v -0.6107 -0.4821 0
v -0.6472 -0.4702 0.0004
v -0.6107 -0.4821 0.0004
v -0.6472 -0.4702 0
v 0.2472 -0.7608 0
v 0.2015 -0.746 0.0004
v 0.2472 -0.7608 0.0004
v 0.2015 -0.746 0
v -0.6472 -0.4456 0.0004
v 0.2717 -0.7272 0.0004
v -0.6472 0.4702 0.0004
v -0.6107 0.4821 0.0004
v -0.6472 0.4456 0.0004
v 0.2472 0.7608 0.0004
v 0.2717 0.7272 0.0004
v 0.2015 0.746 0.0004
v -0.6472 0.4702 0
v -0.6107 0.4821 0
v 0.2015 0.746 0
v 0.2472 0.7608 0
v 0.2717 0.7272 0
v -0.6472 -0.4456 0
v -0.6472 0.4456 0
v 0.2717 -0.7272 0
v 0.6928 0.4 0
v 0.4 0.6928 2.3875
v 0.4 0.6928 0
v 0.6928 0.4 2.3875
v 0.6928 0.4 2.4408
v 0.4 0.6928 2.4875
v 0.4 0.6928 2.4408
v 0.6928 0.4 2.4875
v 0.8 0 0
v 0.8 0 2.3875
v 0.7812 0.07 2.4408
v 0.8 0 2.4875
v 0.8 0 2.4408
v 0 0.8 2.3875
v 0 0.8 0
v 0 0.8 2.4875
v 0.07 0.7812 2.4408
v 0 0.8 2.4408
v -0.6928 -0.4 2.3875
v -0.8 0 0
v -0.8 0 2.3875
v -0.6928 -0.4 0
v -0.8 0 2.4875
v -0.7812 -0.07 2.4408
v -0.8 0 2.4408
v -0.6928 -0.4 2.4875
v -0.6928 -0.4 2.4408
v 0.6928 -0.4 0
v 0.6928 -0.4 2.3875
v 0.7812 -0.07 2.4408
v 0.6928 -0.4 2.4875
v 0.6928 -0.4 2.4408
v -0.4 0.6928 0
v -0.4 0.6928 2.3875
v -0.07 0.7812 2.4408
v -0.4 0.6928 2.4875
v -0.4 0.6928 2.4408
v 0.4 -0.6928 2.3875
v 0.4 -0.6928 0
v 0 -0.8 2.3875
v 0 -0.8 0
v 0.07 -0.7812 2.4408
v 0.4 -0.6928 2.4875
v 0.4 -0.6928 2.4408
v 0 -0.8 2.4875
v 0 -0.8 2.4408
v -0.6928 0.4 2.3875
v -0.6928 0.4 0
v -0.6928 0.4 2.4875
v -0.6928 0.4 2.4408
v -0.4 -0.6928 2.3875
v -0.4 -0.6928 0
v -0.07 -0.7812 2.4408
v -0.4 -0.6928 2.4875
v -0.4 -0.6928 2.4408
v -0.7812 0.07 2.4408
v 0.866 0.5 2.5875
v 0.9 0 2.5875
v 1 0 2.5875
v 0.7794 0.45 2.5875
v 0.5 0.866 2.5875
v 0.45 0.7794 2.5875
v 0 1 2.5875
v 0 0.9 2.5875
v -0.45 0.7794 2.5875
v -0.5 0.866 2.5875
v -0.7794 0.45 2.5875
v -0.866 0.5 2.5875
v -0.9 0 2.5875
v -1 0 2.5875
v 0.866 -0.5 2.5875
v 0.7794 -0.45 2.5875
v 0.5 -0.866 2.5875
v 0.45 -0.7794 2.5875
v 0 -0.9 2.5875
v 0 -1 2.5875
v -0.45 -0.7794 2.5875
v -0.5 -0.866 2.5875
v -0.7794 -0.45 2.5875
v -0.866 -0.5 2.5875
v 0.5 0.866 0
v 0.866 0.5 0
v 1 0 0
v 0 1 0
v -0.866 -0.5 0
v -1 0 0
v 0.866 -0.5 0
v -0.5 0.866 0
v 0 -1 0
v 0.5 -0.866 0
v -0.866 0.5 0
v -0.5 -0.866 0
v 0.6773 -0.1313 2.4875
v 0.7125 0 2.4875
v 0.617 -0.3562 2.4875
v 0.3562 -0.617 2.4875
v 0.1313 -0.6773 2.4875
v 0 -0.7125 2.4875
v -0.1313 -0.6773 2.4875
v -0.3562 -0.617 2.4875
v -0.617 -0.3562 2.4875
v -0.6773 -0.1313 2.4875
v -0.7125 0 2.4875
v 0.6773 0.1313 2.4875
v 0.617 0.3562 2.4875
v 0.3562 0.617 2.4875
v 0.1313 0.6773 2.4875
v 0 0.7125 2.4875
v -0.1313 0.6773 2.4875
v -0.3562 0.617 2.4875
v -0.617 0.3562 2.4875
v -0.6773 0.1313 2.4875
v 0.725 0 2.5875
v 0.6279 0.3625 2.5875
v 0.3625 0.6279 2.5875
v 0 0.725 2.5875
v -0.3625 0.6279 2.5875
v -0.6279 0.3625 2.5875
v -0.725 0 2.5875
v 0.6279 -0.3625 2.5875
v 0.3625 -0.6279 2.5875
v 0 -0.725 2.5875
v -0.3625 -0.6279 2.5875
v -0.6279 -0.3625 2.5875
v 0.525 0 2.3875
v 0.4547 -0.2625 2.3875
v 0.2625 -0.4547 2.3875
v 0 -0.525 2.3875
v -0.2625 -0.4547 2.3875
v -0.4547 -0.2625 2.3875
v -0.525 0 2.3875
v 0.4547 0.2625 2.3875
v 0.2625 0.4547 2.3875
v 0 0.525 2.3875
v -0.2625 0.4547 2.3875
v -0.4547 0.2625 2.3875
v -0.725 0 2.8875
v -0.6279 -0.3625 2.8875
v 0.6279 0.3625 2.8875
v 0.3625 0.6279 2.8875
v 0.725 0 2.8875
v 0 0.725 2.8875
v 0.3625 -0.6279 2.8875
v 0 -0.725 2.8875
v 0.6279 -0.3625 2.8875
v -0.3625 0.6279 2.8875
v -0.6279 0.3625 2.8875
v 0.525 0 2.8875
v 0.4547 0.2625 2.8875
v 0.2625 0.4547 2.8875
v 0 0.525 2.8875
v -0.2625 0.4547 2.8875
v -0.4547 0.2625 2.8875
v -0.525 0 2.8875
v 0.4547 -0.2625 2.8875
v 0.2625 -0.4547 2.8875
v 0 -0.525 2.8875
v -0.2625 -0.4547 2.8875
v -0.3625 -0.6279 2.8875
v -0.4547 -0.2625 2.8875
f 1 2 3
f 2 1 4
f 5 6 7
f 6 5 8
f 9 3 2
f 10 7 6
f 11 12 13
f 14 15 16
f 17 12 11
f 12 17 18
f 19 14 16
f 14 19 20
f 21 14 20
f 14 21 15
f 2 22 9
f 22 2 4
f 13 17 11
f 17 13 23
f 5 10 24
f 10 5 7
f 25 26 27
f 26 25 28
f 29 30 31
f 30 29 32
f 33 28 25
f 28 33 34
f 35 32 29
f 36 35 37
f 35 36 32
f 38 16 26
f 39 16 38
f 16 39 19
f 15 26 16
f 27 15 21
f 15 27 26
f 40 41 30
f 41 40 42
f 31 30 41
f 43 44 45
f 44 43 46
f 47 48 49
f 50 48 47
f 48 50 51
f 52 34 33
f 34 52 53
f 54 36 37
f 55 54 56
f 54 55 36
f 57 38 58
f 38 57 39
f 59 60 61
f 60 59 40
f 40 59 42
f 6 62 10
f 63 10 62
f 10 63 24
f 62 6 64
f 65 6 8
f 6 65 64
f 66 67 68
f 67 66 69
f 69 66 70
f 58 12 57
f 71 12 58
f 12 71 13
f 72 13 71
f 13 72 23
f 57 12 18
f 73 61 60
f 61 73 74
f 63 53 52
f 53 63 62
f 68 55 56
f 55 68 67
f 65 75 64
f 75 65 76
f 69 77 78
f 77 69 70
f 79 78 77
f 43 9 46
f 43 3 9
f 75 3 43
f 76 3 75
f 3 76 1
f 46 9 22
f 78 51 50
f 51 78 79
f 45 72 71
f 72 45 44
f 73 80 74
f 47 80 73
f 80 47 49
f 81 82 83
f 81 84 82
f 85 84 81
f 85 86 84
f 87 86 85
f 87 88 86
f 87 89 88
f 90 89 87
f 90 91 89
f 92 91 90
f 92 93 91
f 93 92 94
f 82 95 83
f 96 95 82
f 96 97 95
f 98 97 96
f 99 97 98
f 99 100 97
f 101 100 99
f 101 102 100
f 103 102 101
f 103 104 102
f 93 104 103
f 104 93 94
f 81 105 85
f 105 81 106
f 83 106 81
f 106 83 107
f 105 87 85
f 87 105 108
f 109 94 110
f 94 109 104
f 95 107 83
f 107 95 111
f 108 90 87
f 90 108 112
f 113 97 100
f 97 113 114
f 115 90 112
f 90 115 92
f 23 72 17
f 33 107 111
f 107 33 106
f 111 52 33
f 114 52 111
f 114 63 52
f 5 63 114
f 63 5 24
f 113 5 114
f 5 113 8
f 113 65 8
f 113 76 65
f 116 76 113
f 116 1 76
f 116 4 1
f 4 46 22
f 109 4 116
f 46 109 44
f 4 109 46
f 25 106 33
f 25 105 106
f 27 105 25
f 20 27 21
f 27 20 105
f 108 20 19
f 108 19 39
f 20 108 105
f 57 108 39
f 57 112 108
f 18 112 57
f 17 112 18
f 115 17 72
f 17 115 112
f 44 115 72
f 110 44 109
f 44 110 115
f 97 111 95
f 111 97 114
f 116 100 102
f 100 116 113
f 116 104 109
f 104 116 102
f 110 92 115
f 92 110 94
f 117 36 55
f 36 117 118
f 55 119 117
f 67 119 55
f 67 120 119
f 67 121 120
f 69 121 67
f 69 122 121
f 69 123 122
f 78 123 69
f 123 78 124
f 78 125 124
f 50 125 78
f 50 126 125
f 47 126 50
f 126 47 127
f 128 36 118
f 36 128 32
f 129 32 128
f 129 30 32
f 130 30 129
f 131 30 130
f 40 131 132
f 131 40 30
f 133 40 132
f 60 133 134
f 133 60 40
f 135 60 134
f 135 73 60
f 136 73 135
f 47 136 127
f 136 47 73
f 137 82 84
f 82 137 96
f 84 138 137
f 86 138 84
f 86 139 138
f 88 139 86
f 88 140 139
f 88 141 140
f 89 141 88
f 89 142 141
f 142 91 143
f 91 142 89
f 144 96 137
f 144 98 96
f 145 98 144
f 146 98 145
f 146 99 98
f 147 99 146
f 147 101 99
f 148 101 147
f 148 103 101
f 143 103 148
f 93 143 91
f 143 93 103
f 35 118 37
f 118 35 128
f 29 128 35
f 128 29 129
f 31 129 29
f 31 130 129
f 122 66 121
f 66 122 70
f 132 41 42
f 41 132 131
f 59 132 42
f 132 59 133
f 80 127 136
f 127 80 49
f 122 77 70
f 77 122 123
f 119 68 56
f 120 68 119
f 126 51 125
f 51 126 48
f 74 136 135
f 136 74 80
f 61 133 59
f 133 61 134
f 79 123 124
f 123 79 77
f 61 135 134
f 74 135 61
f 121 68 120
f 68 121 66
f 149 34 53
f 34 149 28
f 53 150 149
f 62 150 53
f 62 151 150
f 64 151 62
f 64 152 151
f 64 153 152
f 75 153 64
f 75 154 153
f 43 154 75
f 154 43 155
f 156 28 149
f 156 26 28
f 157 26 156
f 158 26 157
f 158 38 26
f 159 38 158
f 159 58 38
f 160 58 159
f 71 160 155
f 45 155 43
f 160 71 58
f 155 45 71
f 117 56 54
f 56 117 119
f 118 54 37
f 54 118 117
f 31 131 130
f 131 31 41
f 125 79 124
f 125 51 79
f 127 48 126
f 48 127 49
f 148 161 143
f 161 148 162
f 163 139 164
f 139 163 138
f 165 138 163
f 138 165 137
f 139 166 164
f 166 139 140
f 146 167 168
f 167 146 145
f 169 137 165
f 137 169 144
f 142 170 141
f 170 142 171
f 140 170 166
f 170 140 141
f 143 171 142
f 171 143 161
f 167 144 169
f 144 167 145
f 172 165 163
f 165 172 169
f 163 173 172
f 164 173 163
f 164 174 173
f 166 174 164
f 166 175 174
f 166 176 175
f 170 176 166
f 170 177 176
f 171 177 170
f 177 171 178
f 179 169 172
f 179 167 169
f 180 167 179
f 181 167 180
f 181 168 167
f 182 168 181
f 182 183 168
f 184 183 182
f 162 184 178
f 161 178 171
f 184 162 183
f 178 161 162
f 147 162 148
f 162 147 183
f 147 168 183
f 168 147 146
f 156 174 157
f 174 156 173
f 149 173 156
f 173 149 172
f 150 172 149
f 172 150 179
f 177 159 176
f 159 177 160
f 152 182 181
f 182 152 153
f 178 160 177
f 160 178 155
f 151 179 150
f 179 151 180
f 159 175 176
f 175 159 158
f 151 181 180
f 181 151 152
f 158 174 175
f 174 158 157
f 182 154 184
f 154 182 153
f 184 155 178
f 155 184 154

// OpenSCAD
tolerance=0.075;
hole_radius=0.075;
grid_hole_radius=0.075;
outer_radius=1;
thickness=0.2;
hole_attach_height=0.075;
attach_thickness=0.1;

//parameters that don't have to be defined explicitly
eps = tolerance/100;
inner_radius = outer_radius - thickness;
fn = 12;
fnh = 6;

module angled_cylinder(angle_deg_y, _h, _r, angle_deg_x = 0) {
    rotate([angle_deg_x, angle_deg_y, 0]) { // Rotate the cylinder 
            cylinder(h = _h, r = _r, center = true, $fn = fnh);
        }
}

module hole(_h) {
    cylinder(h = _h, r = grid_hole_radius, $fn = fnh);
}

//makes circle of holes
module circular_grid(_h, _r, _n) {
    for (i = [0:_n-1]) {
        angle = i * 360 / _n;
        x_pos = _r * cos(angle);
        y_pos = _r * sin(angle);
        translate([x_pos, y_pos, -eps]) {
            hole(_h);
        }
    }
}

//makes grid of holes
module hole_grid(hole_height, grid_h) {
    translate([0,0,hole_height]) {
        difference() {
            //cylinder
            cylinder(h = grid_h, r = (inner_radius + outer_radius)/2, 
                center=false, $fn = fn);
            //holes
            for (i = [0 : grid_hole_radius * 2 + hole_attach_height : inner_radius - grid_hole_radius * 2]) {
                circular_grid(grid_h + eps*2, i, ceil(6.28*i/(grid_hole_radius*4)));
            }
            
        } 
    }
}

//makes curve of CSC
module curve(_radius, _twist, _turning_angle, _turning_radius) {
    rotate([90,0,_twist])
    translate([-_turning_radius, 0, 0])
    rotate_extrude(angle=_turning_angle, convexity=100, $fn = fn)
    translate([_turning_radius, 0]) circle(_radius);
}

module CSC(_r, _t1, _ta1, _tr1, _h, _t2, _ta2, _tr2, is_inner) {
    
    if (_ta1 > 90) {
        CSC(_r, _t1, 90, _tr1, 0, 0, 0, 0, is_inner);
        
        pos1 = (-_tr1 + sqrt(_tr1*_tr1 - pow(_tr1,2)));
        translate([pos1*cos(_t1),pos1*sin(_t1),_tr1])
        rotate([0,-90,_t1])
        CSC(_r, 0, _ta1 - 90, _tr1, _h, _t2, _ta2, _tr2, is_inner);
    } else if (_ta2 > 90) {
        CSC(_r, _t1, _ta1, _tr1, _h, _t2, 90, _tr2, is_inner);
        
        pos1 = (-_tr1 + sqrt(_tr1*_tr1 - pow(_tr1*sin(_ta1),2)));
        pos2 = (-_tr2 + sqrt(_tr2*_tr2 - pow(_tr2,2)));
        translate([pos1*cos(_t1),pos1*sin(_t1),_tr1*sin(_ta1)])
        rotate([0,-_ta1,_t1])
        translate([0, 0, _h])
        translate([pos2*cos(_t2),pos2*sin(_t2),_tr2])
        rotate([0,-90,_t2])
        CSC(_r, 0, 0, 0, 0, 0, _ta2 - 90, _tr2, is_inner);
    } else {
        //intermediate positions
        pos1 = (-_tr1 + sqrt(_tr1*_tr1 - pow(_tr1*sin(_ta1),2)));
        pos2 = (-_tr2 + sqrt(_tr2*_tr2 - pow(_tr2*sin(_ta2),2)));
        
        union() {
            //bottom shell threshold
            if (is_inner) {
                cylinder(h=eps, r=_r, center=true);
            }
            
            //first curve of CSC
            curve(_r, _t1, _ta1, _tr1);
            
            //straight link of CSC
            translate([pos1*cos(_t1),pos1*sin(_t1),_tr1*sin(_ta1)])
            rotate([0,-_ta1,_t1])
            if (is_inner) {
                //add threshold for shelling
                translate([0,0,-eps /2])
                cylinder(h=_h + eps,r=_r, center = false, $fn= fn);
            } else {
                cylinder(h=_h,r=_r, center = false, $fn= fn);
            }
            
            //second curve of CSC
            translate([pos1*cos(_t1),pos1*sin(_t1),_tr1*sin(_ta1)])
            rotate([0,-_ta1,_t1])
            translate([0, 0, _h])
            curve(_r, _t2, _ta2, _tr2);
            
            //shelling thresholds
            if (is_inner) {
                translate([pos1*cos(_t1),pos1*sin(_t1),_tr1*sin(_ta1)])
                rotate([0,-_ta1,_t1])
                translate([0, 0, _h])
                translate([pos2*cos(_t2),pos2*sin(_t2),_tr2*sin(_ta2)])
                rotate([0,-_ta2,_t2]) {
                    cylinder(h=eps, r=_r, center=true,$fn=fn);
                }
            
            }
        }
    }
    
}

//allow modules to attach
module CSC_ATTACH(_r, _t1, _ta1, _tr1, _h, _t2, _ta2, _tr2, next_hole_radius, next_hole_attach_height, next_inner) {
    
    if (_ta1 > 90) {        
        pos1 = (-_tr1 + sqrt(_tr1*_tr1 - pow(_tr1,2)));
        translate([pos1*cos(_t1),pos1*sin(_t1),_tr1])
        rotate([0,-90,_t1])
        CSC_ATTACH(_r, 0, _ta1 - 90, _tr1, _h, _t2, _ta2, _tr2, next_hole_radius, next_hole_attach_height, next_inner);
    } else if (_ta2 > 90) {        
        pos1 = (-_tr1 + sqrt(_tr1*_tr1 - pow(_tr1*sin(_ta1),2)));
        pos2 = (-_tr2 + sqrt(_tr2*_tr2 - pow(_tr2,2)));
        translate([pos1*cos(_t1),pos1*sin(_t1),_tr1*sin(_ta1)])
        rotate([0,-_ta1,_t1])
        translate([0, 0, _h])
        translate([pos2*cos(_t2),pos2*sin(_t2),_tr2])
        rotate([0,-90,_t2])
        CSC_ATTACH(_r, 0, 0, 0, 0, 0, _ta2 - 90, _tr2, next_hole_radius, next_hole_attach_height, next_inner);
    } else {
        //intermediate positions
        pos1 = (-_tr1 + sqrt(_tr1*_tr1 - pow(_tr1*sin(_ta1),2)));
        pos2 = (-_tr2 + sqrt(_tr2*_tr2 - pow(_tr2*sin(_ta2),2)));
        
        translate([pos1*cos(_t1),pos1*sin(_t1),_tr1*sin(_ta1)])
        rotate([0,-_ta1,_t1])
        translate([0, 0, _h])
        translate([pos2*cos(_t2),pos2*sin(_t2),_tr2*sin(_ta2)])
        rotate([0,-_ta2,_t2]) {
            difference() {
                union() {
                    //attachment for smaller cylinder
                    translate([0,0,-attach_thickness])
                    cylinder(h=attach_thickness, r=_r - thickness/2, $fn=fn);
                    translate([0,0,-attach_thickness*2])
                    cylinder(h=attach_thickness*2, r1=_r - thickness/2, r2=next_inner - tolerance - thickness, $fn=fn);
                    
                    //small cylinder
                    cylinder(h=next_hole_radius*2 + next_hole_attach_height * 2, r = next_inner - tolerance, $fn=fn);
                }
                
                //shelling
                translate([0,0, -attach_thickness*2 - eps/2])
                cylinder(h=next_hole_radius*2 + next_hole_attach_height * 2 + attach_thickness*2 + eps, r = min(inner_radius, next_inner - tolerance - thickness), $fn=fn);
                
                //holes for screws
    //            translate([0,0,next_hole_attach_height + next_hole_radius]) {
    //                angled_cylinder(0, (next_inner + thickness + eps) * 2,  hole_radius, 90);
    //                angled_cylinder(90, (next_inner + thickness + eps) * 2, hole_radius, 0);
    //            }
            }
        }
    }
}

//remove overlap to allow all branches to attach to each other
module CSC_REMOVE_OVERLAP(_r, _t1, _ta1, _tr1, _h, _t2, _ta2, _tr2, next_hole_radius, next_hole_attach_height, next_inner) {
    if (_ta1 > 90) {        
        pos1 = (-_tr1 + sqrt(_tr1*_tr1 - pow(_tr1,2)));
        translate([pos1*cos(_t1),pos1*sin(_t1),_tr1])
        rotate([0,-90,_t1])
        CSC_REMOVE_OVERLAP(_r, 0, _ta1 - 90, _tr1, _h, _t2, _ta2, _tr2, next_hole_radius, next_hole_attach_height, next_inner);
    } else if (_ta2 > 90) {        
        pos1 = (-_tr1 + sqrt(_tr1*_tr1 - pow(_tr1*sin(_ta1),2)));
        pos2 = (-_tr2 + sqrt(_tr2*_tr2 - pow(_tr2,2)));
        translate([pos1*cos(_t1),pos1*sin(_t1),_tr1*sin(_ta1)])
        rotate([0,-_ta1,_t1])
        translate([0, 0, _h])
        translate([pos2*cos(_t2),pos2*sin(_t2),_tr2])
        rotate([0,-90,_t2])
        CSC_REMOVE_OVERLAP(_r, 0, 0, 0, 0, 0, _ta2 - 90, _tr2, next_hole_radius, next_hole_attach_height, next_inner);
    } else {
        pos1 = (-_tr1 + sqrt(_tr1*_tr1 - pow(_tr1*sin(_ta1),2)));
        pos2 = (-_tr2 + sqrt(_tr2*_tr2 - pow(_tr2*sin(_ta2),2)));
        
        translate([pos1*cos(_t1),pos1*sin(_t1),_tr1*sin(_ta1)])
        rotate([0,-_ta1,_t1])
        translate([0, 0, _h])
        translate([pos2*cos(_t2),pos2*sin(_t2),_tr2*sin(_ta2)])
        rotate([0,-_ta2,_t2]) {
            cylinder(h=999999, r=_r + tolerance, $fn=fn);
        }
    }
}

//c is _t1, _ta1, _tr1, _h, _t2, _ta2, _tr2, next hole radius, next hole height, next inner radius
module branch(branch_list, _outer, _inner) {
    union() {
        //make grid of holes
        //hole_grid(hole_radius*2 + hole_attach_height * 2, grid_hole_radius);
        
        //make CSC shells for each CSC in branch_list
        difference() {
            for (c = branch_list) {
                CSC(_outer,c[0],c[1],c[2],c[3],c[4],c[5],c[6], false);
            }
            
            for (c = branch_list) {
                CSC(_inner,c[0],c[1],c[2],c[3],c[4],c[5],c[6], true);
                CSC_REMOVE_OVERLAP(_outer,c[0],c[1],c[2],c[3],c[4],c[5],c[6],c[7], c[8], c[9]);
            }
            
            //make screw holes at the bottom
//            translate([0,0,hole_radius + hole_attach_height]) {
//                angled_cylinder(0, (outer_radius*1.5 + eps) * 2,  hole_radius, 90);
//                angled_cylinder(90, (outer_radius*1.5 + eps) * 2, hole_radius, 0);
//            }    
        }
        for (c=branch_list) {     
            CSC_ATTACH(_outer,c[0],c[1],c[2],c[3],c[4],c[5],c[6], c[7], c[8], c[9]);
        }
    }
}

branch([
[ 0.0, 0.0, 1.0*outer_radius, 2.5875*outer_radius, 0.0, 0.0, 1.0*outer_radius, 0.075, 0.075, 0.8],
],outer_radius,inner_radius);
